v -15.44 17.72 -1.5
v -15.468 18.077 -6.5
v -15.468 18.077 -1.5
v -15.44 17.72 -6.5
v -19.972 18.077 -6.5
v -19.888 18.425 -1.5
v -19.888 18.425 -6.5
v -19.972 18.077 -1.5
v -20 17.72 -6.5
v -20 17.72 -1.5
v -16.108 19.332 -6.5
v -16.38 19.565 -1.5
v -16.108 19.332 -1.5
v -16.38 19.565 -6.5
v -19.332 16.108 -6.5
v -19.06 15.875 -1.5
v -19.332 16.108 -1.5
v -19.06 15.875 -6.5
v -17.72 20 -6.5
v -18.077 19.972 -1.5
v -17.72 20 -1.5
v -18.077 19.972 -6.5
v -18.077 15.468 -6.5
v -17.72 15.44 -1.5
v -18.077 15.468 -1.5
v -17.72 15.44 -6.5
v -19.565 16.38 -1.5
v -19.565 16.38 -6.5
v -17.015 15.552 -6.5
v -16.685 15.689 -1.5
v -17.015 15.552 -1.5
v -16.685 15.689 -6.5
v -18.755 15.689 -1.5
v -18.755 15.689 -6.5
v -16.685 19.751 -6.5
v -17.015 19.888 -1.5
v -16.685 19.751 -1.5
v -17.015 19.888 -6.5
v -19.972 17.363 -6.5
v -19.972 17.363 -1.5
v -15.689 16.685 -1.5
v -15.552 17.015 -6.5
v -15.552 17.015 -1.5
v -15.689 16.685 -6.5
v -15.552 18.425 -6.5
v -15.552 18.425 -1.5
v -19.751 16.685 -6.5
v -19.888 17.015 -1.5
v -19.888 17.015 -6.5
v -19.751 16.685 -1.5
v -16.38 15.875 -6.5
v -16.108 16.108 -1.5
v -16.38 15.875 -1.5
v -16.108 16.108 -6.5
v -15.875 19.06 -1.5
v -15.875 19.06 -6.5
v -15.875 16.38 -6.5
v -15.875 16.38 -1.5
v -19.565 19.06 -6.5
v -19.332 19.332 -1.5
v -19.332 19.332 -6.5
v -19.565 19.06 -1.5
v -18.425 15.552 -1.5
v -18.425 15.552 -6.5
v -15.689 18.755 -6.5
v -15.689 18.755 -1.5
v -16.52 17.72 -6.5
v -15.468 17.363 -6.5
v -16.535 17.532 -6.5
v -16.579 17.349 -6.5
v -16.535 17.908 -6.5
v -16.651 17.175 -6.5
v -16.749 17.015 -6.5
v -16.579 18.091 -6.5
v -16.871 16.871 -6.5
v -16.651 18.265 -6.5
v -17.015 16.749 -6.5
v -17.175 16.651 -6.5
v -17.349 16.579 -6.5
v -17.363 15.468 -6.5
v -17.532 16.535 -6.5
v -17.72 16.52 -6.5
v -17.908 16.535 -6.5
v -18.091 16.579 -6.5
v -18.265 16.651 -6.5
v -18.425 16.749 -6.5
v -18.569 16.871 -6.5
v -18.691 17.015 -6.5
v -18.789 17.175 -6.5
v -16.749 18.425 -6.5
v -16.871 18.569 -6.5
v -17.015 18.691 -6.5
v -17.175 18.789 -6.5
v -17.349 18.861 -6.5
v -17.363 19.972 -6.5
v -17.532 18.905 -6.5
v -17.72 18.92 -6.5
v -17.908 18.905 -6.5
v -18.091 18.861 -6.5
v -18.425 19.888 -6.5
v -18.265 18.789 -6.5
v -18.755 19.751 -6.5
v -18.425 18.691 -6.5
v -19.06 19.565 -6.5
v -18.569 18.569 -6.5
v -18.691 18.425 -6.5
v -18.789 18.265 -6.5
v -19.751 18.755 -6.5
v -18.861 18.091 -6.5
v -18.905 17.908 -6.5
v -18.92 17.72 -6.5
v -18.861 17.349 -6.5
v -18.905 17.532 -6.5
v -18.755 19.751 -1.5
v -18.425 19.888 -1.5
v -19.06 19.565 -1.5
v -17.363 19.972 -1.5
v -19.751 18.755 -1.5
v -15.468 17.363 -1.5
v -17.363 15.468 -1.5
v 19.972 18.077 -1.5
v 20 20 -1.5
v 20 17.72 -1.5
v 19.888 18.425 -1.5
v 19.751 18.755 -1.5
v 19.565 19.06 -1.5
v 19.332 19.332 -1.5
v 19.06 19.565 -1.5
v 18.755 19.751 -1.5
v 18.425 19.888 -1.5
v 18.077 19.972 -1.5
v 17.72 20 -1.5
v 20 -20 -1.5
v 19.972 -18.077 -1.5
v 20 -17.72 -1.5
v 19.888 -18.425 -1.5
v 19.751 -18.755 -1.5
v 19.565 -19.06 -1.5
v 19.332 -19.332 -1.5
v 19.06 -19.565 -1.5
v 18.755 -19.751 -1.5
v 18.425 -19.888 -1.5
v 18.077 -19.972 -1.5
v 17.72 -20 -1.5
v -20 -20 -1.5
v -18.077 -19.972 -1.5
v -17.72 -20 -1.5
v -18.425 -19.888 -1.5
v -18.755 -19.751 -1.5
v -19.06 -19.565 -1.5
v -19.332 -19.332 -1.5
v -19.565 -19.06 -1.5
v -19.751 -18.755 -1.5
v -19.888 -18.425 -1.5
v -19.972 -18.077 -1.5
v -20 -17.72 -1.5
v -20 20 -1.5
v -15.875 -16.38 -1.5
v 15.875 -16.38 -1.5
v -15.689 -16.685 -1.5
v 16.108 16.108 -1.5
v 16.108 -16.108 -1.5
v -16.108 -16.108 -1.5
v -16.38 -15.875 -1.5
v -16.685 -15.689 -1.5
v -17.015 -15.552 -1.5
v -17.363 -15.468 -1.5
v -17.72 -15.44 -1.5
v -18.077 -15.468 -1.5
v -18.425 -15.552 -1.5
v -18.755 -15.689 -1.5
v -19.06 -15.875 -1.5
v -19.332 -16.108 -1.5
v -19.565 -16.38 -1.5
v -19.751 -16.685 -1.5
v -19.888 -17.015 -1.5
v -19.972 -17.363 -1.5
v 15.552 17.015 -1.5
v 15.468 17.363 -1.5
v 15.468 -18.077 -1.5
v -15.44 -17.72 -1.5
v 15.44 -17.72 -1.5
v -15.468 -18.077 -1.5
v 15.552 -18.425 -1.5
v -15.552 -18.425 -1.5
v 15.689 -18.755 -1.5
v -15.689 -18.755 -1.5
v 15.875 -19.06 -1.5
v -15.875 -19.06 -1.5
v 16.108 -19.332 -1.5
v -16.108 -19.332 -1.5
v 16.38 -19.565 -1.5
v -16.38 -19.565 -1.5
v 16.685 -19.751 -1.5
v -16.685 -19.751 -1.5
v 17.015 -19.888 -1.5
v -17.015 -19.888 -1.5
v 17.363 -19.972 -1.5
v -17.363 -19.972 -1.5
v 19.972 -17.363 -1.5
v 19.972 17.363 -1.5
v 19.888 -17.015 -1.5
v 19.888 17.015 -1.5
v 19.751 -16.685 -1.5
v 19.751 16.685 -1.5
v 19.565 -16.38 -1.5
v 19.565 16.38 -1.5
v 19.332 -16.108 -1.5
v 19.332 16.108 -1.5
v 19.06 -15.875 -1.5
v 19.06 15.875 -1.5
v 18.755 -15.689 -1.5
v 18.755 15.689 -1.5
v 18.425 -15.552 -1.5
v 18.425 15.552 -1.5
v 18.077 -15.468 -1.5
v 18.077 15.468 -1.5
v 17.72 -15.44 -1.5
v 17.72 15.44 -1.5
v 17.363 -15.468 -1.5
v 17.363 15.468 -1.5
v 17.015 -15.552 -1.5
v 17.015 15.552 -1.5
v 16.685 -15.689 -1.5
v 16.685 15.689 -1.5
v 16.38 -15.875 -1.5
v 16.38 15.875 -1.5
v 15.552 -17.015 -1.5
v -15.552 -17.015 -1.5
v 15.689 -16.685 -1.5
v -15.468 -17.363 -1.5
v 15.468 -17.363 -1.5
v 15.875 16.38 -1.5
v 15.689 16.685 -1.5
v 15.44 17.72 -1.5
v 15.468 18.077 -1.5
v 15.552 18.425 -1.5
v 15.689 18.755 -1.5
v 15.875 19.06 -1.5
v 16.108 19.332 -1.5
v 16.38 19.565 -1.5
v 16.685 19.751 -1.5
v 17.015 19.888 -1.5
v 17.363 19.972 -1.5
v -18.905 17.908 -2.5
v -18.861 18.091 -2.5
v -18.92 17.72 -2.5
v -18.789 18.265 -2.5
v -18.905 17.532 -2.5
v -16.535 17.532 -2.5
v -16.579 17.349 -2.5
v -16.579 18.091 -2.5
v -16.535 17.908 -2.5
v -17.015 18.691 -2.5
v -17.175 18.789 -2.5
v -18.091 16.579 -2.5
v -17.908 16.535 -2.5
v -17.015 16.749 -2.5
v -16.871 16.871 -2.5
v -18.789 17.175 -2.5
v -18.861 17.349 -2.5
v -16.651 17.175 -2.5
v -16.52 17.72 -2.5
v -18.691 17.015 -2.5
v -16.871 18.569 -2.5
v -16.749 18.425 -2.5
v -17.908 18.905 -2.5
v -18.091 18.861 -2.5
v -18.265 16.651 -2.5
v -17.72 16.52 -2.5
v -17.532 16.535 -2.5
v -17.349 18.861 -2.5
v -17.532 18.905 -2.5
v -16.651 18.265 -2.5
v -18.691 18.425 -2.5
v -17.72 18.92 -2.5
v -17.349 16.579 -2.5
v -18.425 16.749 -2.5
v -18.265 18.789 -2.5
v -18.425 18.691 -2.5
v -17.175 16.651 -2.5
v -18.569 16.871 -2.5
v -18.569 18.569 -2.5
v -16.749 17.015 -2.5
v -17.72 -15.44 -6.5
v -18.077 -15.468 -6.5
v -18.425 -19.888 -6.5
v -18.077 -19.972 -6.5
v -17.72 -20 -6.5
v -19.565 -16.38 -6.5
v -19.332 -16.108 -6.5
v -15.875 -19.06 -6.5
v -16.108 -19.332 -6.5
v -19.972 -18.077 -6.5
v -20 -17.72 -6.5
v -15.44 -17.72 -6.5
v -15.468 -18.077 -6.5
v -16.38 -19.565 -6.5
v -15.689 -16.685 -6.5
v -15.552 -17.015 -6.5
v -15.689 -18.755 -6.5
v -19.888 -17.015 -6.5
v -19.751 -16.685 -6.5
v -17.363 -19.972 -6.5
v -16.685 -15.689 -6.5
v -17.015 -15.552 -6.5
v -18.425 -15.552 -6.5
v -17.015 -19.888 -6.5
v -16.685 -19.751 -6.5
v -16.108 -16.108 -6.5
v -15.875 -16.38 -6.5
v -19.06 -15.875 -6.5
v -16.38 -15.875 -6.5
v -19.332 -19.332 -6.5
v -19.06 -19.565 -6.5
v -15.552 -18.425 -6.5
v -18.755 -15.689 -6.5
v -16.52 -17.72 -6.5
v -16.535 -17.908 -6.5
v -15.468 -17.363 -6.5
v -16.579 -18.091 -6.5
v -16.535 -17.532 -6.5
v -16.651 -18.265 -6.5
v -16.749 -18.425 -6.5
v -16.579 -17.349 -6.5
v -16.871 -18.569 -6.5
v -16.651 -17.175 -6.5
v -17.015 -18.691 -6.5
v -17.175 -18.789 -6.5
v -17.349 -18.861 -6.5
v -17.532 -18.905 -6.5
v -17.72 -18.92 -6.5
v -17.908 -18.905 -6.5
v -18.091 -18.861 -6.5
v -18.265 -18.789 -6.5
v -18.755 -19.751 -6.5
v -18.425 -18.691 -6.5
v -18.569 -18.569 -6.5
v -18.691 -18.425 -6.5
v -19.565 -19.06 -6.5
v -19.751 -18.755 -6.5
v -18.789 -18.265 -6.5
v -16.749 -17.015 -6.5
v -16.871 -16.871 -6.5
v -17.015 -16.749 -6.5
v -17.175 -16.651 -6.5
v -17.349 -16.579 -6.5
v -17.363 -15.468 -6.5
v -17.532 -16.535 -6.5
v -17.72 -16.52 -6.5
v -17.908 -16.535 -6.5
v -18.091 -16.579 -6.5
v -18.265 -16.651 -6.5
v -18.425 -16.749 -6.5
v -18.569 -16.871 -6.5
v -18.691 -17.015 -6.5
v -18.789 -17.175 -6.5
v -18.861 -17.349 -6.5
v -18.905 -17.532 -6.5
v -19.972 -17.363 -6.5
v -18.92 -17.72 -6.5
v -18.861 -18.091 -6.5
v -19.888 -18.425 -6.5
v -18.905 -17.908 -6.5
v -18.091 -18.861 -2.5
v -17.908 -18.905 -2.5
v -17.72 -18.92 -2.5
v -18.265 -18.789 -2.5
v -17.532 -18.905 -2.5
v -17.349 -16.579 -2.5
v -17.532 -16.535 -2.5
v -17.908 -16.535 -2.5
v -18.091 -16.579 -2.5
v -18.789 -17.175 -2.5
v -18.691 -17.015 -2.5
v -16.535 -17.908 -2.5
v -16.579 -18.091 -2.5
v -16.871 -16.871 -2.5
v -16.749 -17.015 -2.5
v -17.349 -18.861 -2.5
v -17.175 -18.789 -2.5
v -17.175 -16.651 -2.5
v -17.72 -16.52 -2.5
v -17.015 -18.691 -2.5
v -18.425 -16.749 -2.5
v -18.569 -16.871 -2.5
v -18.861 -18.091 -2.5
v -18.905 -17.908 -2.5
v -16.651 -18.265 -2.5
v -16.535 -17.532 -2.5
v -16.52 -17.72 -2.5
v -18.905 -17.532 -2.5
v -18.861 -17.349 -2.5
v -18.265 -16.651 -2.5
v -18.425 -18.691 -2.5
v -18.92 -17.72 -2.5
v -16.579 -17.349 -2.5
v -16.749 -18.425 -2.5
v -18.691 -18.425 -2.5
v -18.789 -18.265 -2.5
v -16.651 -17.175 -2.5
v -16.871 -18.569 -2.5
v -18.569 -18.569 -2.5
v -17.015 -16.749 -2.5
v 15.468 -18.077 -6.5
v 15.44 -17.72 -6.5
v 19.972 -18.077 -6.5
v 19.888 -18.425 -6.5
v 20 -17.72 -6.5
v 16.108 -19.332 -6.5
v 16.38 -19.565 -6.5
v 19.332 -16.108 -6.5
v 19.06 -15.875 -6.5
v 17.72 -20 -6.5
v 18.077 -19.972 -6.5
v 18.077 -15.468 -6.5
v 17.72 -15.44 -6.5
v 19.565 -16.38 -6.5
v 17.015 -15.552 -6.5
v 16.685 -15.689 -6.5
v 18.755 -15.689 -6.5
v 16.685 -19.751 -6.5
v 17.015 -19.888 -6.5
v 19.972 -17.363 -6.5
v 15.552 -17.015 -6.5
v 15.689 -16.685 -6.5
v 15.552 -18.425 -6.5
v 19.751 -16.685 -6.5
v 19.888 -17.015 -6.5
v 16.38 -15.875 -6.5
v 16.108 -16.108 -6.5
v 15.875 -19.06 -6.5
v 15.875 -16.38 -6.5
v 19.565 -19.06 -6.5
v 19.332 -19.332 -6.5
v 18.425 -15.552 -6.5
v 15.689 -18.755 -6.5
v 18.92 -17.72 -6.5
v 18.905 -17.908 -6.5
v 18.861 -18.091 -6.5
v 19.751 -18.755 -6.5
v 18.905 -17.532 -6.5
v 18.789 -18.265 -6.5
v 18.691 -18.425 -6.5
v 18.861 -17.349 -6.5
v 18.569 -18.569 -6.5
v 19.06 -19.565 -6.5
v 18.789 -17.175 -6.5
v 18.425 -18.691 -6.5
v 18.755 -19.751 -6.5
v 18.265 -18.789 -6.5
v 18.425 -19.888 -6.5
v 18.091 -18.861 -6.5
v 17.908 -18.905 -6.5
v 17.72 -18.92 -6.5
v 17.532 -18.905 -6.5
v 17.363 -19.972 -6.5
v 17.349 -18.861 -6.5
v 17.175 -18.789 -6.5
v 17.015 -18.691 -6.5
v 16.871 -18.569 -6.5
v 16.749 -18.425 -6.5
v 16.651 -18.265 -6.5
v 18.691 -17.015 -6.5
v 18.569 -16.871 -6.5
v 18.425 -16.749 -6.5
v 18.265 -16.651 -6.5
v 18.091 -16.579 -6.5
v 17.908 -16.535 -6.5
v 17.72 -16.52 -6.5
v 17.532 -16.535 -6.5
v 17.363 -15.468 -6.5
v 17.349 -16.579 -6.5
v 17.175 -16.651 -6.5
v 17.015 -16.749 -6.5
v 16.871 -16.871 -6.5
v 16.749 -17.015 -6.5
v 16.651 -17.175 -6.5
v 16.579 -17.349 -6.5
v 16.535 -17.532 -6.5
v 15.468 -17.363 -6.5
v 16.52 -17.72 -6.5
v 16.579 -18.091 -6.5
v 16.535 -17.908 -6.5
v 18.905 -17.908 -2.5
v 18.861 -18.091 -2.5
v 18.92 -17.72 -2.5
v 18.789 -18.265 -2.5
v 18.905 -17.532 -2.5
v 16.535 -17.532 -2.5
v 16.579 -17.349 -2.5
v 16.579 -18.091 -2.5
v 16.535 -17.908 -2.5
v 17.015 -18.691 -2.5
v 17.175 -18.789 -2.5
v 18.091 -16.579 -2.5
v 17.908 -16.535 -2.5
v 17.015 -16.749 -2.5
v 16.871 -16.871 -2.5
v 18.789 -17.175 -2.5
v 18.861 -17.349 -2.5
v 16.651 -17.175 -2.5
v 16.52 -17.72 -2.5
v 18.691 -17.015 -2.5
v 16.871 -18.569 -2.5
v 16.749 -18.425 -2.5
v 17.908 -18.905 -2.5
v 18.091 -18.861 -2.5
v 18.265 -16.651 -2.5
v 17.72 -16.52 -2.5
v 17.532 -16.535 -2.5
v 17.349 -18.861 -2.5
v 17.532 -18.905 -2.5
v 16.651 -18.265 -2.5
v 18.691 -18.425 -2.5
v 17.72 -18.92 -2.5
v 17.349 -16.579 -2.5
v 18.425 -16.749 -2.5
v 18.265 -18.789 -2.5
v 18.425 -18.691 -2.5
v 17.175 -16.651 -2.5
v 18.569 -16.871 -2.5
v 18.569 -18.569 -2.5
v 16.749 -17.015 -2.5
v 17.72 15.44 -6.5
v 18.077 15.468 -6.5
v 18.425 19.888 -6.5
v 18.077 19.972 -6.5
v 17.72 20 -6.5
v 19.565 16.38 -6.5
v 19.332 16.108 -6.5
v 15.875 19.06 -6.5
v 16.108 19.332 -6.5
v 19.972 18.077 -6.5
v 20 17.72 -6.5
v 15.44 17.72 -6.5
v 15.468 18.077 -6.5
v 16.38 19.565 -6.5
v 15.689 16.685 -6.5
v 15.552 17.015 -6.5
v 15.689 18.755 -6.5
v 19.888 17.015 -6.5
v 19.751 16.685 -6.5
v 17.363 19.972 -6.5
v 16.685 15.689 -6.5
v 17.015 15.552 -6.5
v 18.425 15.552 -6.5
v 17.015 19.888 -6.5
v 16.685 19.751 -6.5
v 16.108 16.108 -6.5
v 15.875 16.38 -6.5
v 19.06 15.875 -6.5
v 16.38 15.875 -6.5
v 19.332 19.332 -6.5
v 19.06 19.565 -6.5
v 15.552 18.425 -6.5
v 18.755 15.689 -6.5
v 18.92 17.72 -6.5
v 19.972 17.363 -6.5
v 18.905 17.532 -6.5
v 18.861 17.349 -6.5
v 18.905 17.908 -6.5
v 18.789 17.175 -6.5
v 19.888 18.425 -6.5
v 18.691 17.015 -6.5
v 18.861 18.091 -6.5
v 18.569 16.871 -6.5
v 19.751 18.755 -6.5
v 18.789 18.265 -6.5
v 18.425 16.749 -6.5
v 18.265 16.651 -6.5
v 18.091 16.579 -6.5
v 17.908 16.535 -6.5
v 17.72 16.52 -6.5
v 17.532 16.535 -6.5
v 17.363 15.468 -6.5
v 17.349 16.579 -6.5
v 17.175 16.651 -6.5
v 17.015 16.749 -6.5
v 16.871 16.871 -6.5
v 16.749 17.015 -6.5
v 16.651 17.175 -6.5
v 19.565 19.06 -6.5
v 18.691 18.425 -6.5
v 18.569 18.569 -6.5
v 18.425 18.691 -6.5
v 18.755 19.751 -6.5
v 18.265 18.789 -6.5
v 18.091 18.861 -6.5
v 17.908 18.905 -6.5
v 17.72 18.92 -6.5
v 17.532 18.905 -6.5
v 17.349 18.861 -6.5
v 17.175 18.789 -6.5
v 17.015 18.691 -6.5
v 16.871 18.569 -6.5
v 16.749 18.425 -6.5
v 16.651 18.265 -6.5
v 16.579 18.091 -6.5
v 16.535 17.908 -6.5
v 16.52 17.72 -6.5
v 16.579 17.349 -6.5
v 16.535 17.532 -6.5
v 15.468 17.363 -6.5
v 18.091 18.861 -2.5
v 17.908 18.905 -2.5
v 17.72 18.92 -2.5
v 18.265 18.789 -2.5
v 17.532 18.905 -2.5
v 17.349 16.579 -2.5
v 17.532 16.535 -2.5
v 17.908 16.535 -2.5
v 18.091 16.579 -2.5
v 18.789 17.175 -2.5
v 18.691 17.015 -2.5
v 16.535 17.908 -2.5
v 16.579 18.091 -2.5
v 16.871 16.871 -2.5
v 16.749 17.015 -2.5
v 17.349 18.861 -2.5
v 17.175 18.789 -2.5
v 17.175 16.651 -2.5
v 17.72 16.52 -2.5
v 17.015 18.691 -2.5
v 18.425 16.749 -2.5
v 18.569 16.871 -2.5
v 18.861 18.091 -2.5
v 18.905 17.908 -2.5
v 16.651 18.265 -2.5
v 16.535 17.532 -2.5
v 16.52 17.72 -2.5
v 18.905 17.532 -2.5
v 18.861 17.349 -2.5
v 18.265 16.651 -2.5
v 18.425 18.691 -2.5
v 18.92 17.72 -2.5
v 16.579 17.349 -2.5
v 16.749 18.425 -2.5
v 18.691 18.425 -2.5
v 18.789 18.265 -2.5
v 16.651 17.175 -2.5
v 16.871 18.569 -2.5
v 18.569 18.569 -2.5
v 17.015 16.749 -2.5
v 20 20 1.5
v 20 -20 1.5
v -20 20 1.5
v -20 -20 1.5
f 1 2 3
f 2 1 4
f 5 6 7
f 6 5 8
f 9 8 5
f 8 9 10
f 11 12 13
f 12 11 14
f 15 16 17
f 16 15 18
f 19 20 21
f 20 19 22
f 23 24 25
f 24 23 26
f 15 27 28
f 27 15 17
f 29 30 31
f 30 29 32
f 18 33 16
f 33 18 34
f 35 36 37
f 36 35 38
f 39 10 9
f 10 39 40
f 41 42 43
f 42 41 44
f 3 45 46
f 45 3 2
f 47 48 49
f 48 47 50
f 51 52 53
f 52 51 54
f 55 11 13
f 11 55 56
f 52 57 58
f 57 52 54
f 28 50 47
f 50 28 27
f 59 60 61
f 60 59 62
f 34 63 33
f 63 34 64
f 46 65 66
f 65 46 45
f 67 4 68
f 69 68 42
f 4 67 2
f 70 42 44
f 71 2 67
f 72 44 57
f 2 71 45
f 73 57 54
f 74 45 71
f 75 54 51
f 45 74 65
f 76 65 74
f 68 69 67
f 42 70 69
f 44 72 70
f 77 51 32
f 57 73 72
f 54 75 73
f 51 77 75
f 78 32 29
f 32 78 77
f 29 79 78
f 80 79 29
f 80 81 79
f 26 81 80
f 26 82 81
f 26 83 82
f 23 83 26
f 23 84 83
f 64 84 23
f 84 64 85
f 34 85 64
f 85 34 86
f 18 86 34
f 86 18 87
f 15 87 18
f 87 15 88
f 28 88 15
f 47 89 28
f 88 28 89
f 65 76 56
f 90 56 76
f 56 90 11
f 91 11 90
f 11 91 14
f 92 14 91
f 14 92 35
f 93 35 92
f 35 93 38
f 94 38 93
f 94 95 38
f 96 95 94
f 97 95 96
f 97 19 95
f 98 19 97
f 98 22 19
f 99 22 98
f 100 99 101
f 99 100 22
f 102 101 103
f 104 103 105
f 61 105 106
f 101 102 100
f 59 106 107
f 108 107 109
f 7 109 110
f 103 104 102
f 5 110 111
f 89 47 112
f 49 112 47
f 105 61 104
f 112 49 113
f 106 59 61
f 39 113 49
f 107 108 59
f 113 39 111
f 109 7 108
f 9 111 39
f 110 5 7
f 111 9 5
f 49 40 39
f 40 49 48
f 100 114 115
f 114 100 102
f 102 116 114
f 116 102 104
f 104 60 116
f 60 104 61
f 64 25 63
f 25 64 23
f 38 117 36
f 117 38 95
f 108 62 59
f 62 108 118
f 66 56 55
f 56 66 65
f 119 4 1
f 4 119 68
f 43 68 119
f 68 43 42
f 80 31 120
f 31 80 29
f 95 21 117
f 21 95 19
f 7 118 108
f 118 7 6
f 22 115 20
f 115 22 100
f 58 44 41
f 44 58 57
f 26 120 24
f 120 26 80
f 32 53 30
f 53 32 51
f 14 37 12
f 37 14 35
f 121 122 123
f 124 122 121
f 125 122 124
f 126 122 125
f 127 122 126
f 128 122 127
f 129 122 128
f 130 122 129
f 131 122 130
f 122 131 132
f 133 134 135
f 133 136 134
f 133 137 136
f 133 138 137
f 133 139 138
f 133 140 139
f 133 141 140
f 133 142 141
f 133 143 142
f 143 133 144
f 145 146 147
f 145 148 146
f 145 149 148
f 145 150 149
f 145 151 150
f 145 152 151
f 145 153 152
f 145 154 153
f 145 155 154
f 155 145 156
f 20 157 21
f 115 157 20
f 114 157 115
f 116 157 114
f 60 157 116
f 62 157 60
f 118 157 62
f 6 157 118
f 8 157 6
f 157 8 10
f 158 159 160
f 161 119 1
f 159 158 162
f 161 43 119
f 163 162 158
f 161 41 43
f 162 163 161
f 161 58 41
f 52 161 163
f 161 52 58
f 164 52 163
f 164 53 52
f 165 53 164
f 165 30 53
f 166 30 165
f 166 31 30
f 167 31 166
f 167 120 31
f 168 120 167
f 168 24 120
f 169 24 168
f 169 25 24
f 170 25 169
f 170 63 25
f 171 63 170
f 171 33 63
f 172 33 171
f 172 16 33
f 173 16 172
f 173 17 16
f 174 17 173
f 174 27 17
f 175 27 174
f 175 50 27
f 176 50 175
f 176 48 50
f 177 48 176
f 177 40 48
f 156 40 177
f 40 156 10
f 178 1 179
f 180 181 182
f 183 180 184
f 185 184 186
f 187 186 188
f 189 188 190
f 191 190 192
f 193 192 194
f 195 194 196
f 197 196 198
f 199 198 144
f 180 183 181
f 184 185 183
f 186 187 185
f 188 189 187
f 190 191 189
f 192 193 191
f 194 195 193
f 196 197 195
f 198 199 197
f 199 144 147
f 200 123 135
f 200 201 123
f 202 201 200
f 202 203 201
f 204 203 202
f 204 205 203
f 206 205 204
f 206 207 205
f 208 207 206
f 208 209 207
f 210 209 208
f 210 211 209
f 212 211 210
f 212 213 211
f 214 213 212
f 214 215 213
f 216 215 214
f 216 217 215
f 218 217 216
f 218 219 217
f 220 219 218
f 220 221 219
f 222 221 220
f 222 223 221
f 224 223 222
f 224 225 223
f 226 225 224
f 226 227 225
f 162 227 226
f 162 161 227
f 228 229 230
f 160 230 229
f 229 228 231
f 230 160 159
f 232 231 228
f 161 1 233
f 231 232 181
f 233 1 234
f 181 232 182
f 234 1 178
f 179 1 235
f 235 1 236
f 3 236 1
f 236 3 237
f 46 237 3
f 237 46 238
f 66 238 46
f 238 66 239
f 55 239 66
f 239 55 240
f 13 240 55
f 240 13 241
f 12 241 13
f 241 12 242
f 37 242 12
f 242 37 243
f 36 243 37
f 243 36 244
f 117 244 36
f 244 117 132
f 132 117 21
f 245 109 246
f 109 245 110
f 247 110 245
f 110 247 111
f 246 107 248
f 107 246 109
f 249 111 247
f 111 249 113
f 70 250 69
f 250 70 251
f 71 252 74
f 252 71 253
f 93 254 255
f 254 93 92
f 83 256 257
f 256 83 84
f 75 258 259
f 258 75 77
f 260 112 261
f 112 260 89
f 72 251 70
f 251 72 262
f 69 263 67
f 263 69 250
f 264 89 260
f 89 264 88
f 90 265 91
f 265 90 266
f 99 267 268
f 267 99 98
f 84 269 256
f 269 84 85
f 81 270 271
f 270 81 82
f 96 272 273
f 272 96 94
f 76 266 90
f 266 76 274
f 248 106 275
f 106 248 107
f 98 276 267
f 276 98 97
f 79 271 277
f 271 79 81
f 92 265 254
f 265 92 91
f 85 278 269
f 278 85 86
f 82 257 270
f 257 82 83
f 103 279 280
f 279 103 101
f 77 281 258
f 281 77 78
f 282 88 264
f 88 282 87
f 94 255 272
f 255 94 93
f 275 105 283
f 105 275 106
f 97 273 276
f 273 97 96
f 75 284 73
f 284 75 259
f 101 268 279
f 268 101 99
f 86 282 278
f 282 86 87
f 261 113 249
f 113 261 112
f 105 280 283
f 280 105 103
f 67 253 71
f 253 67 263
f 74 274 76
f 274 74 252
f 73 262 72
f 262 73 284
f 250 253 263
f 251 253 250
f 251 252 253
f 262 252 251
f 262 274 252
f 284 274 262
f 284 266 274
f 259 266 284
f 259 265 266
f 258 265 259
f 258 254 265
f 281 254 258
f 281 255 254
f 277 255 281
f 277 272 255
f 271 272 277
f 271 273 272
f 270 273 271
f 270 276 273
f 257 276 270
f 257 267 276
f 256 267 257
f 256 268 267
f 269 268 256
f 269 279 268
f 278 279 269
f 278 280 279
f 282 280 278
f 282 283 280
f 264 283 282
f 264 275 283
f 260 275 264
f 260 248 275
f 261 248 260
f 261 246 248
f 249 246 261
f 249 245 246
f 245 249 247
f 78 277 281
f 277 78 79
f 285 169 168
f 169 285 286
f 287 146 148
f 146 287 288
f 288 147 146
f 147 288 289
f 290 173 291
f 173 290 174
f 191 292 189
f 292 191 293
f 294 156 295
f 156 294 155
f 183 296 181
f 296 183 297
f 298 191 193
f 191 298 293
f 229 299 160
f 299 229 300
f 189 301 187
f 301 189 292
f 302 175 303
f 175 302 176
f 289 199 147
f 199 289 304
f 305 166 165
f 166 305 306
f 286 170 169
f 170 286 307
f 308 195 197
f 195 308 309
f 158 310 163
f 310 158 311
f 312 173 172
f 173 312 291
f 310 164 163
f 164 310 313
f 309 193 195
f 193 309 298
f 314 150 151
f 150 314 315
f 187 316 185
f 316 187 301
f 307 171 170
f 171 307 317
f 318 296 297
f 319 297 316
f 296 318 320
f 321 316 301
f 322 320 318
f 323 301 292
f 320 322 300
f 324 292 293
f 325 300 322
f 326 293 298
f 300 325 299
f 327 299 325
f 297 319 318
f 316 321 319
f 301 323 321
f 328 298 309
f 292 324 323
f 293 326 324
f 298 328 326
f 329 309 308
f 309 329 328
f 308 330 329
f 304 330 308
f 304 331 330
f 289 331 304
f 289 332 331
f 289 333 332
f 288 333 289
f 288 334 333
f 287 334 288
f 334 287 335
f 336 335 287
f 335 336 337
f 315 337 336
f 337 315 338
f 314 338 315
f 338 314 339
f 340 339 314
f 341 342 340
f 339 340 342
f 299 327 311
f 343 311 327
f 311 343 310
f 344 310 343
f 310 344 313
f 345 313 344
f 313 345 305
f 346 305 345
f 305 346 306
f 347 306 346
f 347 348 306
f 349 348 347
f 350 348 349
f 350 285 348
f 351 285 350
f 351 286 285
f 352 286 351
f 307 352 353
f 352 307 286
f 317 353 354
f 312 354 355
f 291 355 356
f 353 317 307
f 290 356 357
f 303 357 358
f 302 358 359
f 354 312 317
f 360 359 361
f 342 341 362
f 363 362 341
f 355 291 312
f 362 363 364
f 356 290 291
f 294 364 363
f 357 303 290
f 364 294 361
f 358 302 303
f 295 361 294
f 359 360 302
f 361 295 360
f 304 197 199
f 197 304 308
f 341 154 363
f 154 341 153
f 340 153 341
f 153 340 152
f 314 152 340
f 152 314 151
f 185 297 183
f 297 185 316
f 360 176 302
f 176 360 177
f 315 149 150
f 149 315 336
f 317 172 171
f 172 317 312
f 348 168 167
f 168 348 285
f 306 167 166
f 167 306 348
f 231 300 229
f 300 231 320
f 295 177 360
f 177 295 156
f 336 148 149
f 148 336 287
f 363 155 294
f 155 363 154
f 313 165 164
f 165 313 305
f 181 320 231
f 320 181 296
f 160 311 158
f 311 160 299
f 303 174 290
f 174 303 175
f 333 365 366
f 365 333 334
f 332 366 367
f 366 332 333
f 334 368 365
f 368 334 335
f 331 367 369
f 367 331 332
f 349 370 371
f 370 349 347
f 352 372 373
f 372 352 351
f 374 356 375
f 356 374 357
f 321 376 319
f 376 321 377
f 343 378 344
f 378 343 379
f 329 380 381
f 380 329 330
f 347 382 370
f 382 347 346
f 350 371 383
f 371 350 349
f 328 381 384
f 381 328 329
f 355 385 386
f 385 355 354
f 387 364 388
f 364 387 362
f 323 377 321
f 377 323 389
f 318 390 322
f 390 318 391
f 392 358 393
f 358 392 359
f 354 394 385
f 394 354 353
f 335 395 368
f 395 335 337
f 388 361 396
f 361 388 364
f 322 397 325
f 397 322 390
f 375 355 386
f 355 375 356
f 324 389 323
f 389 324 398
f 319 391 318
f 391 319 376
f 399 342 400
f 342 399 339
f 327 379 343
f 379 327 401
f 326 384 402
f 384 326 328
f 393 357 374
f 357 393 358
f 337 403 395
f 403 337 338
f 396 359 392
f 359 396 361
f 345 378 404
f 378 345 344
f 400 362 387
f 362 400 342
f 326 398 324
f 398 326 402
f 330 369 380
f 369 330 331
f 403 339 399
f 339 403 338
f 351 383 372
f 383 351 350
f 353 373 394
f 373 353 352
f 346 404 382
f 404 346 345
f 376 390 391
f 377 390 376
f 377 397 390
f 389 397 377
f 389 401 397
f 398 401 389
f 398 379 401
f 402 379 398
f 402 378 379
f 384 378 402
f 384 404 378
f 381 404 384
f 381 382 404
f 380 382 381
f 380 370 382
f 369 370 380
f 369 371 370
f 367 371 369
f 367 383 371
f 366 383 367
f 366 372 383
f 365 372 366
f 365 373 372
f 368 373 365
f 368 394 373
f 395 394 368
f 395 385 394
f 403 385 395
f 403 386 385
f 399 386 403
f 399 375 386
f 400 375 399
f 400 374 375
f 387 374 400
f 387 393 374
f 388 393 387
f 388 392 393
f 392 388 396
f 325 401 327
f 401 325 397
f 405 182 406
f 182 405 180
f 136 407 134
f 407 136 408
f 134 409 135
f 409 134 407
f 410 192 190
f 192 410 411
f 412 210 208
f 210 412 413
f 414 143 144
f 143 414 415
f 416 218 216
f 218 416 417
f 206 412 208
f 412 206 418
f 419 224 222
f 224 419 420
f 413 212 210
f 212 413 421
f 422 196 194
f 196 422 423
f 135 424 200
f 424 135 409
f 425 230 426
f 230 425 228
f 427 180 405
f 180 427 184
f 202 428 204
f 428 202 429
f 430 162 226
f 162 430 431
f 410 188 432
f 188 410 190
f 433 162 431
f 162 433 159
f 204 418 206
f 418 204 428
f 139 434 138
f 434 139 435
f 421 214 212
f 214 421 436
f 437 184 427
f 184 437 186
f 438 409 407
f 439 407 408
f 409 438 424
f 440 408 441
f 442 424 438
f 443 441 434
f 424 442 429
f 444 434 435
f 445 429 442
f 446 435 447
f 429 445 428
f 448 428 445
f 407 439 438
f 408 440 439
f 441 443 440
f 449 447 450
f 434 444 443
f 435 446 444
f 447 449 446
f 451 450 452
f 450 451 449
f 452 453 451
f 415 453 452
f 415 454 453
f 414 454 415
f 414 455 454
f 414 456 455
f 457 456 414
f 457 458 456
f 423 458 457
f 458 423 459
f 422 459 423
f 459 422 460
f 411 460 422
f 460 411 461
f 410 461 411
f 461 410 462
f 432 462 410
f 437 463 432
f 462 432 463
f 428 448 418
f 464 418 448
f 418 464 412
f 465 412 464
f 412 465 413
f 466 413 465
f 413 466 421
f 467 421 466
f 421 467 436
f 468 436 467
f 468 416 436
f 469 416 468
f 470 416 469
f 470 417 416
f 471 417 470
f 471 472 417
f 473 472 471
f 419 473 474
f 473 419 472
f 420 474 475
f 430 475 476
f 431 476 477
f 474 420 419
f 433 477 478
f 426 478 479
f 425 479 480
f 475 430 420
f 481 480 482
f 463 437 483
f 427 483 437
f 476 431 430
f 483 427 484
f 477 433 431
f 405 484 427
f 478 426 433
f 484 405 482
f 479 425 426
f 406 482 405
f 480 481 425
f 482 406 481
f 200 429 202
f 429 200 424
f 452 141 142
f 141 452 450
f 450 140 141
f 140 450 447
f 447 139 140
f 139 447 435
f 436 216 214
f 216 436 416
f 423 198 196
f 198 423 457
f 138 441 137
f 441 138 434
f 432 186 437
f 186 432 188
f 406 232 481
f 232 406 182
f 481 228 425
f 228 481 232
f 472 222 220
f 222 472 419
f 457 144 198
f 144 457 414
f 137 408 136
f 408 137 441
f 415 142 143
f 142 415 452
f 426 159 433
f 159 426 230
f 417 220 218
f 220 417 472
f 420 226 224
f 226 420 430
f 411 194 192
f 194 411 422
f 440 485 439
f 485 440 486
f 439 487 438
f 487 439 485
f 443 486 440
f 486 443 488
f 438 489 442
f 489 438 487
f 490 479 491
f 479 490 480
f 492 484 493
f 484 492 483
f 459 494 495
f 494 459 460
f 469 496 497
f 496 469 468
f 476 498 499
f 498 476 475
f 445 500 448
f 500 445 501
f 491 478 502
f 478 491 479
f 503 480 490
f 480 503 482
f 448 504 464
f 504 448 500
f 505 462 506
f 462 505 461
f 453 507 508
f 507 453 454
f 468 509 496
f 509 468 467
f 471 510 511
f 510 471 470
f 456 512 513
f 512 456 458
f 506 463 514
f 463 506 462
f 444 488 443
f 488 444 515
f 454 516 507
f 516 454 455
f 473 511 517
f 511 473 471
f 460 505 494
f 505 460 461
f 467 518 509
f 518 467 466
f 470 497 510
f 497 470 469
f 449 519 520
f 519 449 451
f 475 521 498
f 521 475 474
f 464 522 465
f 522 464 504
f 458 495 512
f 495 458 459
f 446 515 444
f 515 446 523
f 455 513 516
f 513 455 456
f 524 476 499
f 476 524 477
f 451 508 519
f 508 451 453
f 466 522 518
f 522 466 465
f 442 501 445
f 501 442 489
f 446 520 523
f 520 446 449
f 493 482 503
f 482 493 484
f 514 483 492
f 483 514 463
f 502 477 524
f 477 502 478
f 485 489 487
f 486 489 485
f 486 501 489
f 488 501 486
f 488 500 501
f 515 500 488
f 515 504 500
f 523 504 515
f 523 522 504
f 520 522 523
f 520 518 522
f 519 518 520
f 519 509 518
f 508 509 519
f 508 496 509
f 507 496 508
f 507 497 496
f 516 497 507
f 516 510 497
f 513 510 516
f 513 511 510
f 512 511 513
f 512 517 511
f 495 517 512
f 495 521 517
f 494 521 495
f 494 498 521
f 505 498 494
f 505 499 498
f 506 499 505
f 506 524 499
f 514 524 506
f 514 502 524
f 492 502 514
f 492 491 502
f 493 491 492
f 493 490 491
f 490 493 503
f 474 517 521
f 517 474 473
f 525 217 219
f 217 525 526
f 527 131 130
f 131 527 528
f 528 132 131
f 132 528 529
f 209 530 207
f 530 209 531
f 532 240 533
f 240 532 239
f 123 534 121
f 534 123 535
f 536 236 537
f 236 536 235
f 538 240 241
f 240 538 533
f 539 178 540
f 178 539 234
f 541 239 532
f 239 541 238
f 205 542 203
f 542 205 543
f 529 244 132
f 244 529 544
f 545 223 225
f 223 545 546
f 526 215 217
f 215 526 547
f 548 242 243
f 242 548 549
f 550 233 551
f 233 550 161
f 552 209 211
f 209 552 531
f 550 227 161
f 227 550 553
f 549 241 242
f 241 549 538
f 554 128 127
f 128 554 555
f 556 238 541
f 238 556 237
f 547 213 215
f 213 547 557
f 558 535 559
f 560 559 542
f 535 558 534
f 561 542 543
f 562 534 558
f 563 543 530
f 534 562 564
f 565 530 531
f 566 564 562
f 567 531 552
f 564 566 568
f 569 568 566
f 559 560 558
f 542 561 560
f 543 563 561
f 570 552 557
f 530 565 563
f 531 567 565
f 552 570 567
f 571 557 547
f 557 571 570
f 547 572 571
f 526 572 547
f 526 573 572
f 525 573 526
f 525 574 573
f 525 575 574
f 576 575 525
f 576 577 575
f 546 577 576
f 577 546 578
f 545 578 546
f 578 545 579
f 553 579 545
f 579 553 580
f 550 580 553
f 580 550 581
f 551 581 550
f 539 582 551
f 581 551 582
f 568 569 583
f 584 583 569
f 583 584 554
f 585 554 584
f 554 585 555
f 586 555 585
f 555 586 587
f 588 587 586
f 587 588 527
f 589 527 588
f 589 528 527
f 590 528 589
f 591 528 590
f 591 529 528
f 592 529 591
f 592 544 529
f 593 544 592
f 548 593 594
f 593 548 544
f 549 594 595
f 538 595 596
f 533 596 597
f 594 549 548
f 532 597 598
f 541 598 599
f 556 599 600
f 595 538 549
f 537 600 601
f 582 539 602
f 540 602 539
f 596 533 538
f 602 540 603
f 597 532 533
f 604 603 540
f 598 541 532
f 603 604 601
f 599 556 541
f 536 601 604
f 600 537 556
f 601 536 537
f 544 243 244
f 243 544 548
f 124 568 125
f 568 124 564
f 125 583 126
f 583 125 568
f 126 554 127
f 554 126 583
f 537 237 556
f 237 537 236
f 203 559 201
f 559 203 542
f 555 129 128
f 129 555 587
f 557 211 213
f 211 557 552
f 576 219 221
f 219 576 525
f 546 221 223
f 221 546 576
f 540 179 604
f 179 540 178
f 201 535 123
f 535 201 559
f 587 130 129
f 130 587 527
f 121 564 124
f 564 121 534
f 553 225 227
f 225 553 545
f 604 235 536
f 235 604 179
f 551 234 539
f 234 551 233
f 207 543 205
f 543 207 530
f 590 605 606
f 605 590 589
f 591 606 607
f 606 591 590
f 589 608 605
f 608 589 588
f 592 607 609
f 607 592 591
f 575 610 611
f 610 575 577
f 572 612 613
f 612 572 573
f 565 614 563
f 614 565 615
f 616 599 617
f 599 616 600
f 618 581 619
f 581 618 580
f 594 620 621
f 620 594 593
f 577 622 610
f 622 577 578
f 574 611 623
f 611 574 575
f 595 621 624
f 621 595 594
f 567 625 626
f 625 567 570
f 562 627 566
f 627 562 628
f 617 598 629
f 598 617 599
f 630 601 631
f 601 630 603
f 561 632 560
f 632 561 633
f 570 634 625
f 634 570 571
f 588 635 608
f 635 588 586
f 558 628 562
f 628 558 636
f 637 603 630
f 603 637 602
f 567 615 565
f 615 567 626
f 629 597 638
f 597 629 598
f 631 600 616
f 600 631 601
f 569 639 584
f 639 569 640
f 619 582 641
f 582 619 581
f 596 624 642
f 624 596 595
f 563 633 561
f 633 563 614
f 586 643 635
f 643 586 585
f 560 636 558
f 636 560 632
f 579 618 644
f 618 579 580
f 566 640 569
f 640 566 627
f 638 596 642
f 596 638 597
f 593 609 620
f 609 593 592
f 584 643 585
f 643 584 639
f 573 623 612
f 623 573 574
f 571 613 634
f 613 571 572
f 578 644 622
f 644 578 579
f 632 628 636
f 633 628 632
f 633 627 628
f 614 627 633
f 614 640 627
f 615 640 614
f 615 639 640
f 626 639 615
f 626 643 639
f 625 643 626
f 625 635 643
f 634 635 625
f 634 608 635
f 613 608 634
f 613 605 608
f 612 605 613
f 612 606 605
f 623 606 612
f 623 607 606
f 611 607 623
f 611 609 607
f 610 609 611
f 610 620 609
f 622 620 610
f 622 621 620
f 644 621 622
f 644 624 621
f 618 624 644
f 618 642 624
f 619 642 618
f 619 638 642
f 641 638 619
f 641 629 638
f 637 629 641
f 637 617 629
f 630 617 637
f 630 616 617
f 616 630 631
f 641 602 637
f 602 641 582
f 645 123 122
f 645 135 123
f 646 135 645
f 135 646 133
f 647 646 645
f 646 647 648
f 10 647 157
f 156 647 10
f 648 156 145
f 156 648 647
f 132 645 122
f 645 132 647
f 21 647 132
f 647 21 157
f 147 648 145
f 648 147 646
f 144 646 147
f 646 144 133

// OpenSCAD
$fn = 40;

module frame_top() {
  width = 40.0;
  thickness = 3.0;

  tolerance = 1.2;
  screw_size = 2.0;
  screw_safe_size = screw_size * tolerance;

  standoff_size = screw_safe_size * 1.9;
  standoff_height = 5.0;

  cube([width, width, thickness], center=true);

  tx = (width / 2) - standoff_size / 2;
  ty = (width / 2) - standoff_size / 2;
  tz = thickness / 2;
  for (i = [0.0:90.0:360.0]){
    rotate([0.0, 180.0, i])
      difference() {
        translate([tx, ty, tz])
          cylinder(r = standoff_size / 2, h = standoff_height);

        translate([tx, ty, tz + 1])
          cylinder(r = screw_safe_size / 2, h = standoff_height);
      }
  }
}

frame_top();
